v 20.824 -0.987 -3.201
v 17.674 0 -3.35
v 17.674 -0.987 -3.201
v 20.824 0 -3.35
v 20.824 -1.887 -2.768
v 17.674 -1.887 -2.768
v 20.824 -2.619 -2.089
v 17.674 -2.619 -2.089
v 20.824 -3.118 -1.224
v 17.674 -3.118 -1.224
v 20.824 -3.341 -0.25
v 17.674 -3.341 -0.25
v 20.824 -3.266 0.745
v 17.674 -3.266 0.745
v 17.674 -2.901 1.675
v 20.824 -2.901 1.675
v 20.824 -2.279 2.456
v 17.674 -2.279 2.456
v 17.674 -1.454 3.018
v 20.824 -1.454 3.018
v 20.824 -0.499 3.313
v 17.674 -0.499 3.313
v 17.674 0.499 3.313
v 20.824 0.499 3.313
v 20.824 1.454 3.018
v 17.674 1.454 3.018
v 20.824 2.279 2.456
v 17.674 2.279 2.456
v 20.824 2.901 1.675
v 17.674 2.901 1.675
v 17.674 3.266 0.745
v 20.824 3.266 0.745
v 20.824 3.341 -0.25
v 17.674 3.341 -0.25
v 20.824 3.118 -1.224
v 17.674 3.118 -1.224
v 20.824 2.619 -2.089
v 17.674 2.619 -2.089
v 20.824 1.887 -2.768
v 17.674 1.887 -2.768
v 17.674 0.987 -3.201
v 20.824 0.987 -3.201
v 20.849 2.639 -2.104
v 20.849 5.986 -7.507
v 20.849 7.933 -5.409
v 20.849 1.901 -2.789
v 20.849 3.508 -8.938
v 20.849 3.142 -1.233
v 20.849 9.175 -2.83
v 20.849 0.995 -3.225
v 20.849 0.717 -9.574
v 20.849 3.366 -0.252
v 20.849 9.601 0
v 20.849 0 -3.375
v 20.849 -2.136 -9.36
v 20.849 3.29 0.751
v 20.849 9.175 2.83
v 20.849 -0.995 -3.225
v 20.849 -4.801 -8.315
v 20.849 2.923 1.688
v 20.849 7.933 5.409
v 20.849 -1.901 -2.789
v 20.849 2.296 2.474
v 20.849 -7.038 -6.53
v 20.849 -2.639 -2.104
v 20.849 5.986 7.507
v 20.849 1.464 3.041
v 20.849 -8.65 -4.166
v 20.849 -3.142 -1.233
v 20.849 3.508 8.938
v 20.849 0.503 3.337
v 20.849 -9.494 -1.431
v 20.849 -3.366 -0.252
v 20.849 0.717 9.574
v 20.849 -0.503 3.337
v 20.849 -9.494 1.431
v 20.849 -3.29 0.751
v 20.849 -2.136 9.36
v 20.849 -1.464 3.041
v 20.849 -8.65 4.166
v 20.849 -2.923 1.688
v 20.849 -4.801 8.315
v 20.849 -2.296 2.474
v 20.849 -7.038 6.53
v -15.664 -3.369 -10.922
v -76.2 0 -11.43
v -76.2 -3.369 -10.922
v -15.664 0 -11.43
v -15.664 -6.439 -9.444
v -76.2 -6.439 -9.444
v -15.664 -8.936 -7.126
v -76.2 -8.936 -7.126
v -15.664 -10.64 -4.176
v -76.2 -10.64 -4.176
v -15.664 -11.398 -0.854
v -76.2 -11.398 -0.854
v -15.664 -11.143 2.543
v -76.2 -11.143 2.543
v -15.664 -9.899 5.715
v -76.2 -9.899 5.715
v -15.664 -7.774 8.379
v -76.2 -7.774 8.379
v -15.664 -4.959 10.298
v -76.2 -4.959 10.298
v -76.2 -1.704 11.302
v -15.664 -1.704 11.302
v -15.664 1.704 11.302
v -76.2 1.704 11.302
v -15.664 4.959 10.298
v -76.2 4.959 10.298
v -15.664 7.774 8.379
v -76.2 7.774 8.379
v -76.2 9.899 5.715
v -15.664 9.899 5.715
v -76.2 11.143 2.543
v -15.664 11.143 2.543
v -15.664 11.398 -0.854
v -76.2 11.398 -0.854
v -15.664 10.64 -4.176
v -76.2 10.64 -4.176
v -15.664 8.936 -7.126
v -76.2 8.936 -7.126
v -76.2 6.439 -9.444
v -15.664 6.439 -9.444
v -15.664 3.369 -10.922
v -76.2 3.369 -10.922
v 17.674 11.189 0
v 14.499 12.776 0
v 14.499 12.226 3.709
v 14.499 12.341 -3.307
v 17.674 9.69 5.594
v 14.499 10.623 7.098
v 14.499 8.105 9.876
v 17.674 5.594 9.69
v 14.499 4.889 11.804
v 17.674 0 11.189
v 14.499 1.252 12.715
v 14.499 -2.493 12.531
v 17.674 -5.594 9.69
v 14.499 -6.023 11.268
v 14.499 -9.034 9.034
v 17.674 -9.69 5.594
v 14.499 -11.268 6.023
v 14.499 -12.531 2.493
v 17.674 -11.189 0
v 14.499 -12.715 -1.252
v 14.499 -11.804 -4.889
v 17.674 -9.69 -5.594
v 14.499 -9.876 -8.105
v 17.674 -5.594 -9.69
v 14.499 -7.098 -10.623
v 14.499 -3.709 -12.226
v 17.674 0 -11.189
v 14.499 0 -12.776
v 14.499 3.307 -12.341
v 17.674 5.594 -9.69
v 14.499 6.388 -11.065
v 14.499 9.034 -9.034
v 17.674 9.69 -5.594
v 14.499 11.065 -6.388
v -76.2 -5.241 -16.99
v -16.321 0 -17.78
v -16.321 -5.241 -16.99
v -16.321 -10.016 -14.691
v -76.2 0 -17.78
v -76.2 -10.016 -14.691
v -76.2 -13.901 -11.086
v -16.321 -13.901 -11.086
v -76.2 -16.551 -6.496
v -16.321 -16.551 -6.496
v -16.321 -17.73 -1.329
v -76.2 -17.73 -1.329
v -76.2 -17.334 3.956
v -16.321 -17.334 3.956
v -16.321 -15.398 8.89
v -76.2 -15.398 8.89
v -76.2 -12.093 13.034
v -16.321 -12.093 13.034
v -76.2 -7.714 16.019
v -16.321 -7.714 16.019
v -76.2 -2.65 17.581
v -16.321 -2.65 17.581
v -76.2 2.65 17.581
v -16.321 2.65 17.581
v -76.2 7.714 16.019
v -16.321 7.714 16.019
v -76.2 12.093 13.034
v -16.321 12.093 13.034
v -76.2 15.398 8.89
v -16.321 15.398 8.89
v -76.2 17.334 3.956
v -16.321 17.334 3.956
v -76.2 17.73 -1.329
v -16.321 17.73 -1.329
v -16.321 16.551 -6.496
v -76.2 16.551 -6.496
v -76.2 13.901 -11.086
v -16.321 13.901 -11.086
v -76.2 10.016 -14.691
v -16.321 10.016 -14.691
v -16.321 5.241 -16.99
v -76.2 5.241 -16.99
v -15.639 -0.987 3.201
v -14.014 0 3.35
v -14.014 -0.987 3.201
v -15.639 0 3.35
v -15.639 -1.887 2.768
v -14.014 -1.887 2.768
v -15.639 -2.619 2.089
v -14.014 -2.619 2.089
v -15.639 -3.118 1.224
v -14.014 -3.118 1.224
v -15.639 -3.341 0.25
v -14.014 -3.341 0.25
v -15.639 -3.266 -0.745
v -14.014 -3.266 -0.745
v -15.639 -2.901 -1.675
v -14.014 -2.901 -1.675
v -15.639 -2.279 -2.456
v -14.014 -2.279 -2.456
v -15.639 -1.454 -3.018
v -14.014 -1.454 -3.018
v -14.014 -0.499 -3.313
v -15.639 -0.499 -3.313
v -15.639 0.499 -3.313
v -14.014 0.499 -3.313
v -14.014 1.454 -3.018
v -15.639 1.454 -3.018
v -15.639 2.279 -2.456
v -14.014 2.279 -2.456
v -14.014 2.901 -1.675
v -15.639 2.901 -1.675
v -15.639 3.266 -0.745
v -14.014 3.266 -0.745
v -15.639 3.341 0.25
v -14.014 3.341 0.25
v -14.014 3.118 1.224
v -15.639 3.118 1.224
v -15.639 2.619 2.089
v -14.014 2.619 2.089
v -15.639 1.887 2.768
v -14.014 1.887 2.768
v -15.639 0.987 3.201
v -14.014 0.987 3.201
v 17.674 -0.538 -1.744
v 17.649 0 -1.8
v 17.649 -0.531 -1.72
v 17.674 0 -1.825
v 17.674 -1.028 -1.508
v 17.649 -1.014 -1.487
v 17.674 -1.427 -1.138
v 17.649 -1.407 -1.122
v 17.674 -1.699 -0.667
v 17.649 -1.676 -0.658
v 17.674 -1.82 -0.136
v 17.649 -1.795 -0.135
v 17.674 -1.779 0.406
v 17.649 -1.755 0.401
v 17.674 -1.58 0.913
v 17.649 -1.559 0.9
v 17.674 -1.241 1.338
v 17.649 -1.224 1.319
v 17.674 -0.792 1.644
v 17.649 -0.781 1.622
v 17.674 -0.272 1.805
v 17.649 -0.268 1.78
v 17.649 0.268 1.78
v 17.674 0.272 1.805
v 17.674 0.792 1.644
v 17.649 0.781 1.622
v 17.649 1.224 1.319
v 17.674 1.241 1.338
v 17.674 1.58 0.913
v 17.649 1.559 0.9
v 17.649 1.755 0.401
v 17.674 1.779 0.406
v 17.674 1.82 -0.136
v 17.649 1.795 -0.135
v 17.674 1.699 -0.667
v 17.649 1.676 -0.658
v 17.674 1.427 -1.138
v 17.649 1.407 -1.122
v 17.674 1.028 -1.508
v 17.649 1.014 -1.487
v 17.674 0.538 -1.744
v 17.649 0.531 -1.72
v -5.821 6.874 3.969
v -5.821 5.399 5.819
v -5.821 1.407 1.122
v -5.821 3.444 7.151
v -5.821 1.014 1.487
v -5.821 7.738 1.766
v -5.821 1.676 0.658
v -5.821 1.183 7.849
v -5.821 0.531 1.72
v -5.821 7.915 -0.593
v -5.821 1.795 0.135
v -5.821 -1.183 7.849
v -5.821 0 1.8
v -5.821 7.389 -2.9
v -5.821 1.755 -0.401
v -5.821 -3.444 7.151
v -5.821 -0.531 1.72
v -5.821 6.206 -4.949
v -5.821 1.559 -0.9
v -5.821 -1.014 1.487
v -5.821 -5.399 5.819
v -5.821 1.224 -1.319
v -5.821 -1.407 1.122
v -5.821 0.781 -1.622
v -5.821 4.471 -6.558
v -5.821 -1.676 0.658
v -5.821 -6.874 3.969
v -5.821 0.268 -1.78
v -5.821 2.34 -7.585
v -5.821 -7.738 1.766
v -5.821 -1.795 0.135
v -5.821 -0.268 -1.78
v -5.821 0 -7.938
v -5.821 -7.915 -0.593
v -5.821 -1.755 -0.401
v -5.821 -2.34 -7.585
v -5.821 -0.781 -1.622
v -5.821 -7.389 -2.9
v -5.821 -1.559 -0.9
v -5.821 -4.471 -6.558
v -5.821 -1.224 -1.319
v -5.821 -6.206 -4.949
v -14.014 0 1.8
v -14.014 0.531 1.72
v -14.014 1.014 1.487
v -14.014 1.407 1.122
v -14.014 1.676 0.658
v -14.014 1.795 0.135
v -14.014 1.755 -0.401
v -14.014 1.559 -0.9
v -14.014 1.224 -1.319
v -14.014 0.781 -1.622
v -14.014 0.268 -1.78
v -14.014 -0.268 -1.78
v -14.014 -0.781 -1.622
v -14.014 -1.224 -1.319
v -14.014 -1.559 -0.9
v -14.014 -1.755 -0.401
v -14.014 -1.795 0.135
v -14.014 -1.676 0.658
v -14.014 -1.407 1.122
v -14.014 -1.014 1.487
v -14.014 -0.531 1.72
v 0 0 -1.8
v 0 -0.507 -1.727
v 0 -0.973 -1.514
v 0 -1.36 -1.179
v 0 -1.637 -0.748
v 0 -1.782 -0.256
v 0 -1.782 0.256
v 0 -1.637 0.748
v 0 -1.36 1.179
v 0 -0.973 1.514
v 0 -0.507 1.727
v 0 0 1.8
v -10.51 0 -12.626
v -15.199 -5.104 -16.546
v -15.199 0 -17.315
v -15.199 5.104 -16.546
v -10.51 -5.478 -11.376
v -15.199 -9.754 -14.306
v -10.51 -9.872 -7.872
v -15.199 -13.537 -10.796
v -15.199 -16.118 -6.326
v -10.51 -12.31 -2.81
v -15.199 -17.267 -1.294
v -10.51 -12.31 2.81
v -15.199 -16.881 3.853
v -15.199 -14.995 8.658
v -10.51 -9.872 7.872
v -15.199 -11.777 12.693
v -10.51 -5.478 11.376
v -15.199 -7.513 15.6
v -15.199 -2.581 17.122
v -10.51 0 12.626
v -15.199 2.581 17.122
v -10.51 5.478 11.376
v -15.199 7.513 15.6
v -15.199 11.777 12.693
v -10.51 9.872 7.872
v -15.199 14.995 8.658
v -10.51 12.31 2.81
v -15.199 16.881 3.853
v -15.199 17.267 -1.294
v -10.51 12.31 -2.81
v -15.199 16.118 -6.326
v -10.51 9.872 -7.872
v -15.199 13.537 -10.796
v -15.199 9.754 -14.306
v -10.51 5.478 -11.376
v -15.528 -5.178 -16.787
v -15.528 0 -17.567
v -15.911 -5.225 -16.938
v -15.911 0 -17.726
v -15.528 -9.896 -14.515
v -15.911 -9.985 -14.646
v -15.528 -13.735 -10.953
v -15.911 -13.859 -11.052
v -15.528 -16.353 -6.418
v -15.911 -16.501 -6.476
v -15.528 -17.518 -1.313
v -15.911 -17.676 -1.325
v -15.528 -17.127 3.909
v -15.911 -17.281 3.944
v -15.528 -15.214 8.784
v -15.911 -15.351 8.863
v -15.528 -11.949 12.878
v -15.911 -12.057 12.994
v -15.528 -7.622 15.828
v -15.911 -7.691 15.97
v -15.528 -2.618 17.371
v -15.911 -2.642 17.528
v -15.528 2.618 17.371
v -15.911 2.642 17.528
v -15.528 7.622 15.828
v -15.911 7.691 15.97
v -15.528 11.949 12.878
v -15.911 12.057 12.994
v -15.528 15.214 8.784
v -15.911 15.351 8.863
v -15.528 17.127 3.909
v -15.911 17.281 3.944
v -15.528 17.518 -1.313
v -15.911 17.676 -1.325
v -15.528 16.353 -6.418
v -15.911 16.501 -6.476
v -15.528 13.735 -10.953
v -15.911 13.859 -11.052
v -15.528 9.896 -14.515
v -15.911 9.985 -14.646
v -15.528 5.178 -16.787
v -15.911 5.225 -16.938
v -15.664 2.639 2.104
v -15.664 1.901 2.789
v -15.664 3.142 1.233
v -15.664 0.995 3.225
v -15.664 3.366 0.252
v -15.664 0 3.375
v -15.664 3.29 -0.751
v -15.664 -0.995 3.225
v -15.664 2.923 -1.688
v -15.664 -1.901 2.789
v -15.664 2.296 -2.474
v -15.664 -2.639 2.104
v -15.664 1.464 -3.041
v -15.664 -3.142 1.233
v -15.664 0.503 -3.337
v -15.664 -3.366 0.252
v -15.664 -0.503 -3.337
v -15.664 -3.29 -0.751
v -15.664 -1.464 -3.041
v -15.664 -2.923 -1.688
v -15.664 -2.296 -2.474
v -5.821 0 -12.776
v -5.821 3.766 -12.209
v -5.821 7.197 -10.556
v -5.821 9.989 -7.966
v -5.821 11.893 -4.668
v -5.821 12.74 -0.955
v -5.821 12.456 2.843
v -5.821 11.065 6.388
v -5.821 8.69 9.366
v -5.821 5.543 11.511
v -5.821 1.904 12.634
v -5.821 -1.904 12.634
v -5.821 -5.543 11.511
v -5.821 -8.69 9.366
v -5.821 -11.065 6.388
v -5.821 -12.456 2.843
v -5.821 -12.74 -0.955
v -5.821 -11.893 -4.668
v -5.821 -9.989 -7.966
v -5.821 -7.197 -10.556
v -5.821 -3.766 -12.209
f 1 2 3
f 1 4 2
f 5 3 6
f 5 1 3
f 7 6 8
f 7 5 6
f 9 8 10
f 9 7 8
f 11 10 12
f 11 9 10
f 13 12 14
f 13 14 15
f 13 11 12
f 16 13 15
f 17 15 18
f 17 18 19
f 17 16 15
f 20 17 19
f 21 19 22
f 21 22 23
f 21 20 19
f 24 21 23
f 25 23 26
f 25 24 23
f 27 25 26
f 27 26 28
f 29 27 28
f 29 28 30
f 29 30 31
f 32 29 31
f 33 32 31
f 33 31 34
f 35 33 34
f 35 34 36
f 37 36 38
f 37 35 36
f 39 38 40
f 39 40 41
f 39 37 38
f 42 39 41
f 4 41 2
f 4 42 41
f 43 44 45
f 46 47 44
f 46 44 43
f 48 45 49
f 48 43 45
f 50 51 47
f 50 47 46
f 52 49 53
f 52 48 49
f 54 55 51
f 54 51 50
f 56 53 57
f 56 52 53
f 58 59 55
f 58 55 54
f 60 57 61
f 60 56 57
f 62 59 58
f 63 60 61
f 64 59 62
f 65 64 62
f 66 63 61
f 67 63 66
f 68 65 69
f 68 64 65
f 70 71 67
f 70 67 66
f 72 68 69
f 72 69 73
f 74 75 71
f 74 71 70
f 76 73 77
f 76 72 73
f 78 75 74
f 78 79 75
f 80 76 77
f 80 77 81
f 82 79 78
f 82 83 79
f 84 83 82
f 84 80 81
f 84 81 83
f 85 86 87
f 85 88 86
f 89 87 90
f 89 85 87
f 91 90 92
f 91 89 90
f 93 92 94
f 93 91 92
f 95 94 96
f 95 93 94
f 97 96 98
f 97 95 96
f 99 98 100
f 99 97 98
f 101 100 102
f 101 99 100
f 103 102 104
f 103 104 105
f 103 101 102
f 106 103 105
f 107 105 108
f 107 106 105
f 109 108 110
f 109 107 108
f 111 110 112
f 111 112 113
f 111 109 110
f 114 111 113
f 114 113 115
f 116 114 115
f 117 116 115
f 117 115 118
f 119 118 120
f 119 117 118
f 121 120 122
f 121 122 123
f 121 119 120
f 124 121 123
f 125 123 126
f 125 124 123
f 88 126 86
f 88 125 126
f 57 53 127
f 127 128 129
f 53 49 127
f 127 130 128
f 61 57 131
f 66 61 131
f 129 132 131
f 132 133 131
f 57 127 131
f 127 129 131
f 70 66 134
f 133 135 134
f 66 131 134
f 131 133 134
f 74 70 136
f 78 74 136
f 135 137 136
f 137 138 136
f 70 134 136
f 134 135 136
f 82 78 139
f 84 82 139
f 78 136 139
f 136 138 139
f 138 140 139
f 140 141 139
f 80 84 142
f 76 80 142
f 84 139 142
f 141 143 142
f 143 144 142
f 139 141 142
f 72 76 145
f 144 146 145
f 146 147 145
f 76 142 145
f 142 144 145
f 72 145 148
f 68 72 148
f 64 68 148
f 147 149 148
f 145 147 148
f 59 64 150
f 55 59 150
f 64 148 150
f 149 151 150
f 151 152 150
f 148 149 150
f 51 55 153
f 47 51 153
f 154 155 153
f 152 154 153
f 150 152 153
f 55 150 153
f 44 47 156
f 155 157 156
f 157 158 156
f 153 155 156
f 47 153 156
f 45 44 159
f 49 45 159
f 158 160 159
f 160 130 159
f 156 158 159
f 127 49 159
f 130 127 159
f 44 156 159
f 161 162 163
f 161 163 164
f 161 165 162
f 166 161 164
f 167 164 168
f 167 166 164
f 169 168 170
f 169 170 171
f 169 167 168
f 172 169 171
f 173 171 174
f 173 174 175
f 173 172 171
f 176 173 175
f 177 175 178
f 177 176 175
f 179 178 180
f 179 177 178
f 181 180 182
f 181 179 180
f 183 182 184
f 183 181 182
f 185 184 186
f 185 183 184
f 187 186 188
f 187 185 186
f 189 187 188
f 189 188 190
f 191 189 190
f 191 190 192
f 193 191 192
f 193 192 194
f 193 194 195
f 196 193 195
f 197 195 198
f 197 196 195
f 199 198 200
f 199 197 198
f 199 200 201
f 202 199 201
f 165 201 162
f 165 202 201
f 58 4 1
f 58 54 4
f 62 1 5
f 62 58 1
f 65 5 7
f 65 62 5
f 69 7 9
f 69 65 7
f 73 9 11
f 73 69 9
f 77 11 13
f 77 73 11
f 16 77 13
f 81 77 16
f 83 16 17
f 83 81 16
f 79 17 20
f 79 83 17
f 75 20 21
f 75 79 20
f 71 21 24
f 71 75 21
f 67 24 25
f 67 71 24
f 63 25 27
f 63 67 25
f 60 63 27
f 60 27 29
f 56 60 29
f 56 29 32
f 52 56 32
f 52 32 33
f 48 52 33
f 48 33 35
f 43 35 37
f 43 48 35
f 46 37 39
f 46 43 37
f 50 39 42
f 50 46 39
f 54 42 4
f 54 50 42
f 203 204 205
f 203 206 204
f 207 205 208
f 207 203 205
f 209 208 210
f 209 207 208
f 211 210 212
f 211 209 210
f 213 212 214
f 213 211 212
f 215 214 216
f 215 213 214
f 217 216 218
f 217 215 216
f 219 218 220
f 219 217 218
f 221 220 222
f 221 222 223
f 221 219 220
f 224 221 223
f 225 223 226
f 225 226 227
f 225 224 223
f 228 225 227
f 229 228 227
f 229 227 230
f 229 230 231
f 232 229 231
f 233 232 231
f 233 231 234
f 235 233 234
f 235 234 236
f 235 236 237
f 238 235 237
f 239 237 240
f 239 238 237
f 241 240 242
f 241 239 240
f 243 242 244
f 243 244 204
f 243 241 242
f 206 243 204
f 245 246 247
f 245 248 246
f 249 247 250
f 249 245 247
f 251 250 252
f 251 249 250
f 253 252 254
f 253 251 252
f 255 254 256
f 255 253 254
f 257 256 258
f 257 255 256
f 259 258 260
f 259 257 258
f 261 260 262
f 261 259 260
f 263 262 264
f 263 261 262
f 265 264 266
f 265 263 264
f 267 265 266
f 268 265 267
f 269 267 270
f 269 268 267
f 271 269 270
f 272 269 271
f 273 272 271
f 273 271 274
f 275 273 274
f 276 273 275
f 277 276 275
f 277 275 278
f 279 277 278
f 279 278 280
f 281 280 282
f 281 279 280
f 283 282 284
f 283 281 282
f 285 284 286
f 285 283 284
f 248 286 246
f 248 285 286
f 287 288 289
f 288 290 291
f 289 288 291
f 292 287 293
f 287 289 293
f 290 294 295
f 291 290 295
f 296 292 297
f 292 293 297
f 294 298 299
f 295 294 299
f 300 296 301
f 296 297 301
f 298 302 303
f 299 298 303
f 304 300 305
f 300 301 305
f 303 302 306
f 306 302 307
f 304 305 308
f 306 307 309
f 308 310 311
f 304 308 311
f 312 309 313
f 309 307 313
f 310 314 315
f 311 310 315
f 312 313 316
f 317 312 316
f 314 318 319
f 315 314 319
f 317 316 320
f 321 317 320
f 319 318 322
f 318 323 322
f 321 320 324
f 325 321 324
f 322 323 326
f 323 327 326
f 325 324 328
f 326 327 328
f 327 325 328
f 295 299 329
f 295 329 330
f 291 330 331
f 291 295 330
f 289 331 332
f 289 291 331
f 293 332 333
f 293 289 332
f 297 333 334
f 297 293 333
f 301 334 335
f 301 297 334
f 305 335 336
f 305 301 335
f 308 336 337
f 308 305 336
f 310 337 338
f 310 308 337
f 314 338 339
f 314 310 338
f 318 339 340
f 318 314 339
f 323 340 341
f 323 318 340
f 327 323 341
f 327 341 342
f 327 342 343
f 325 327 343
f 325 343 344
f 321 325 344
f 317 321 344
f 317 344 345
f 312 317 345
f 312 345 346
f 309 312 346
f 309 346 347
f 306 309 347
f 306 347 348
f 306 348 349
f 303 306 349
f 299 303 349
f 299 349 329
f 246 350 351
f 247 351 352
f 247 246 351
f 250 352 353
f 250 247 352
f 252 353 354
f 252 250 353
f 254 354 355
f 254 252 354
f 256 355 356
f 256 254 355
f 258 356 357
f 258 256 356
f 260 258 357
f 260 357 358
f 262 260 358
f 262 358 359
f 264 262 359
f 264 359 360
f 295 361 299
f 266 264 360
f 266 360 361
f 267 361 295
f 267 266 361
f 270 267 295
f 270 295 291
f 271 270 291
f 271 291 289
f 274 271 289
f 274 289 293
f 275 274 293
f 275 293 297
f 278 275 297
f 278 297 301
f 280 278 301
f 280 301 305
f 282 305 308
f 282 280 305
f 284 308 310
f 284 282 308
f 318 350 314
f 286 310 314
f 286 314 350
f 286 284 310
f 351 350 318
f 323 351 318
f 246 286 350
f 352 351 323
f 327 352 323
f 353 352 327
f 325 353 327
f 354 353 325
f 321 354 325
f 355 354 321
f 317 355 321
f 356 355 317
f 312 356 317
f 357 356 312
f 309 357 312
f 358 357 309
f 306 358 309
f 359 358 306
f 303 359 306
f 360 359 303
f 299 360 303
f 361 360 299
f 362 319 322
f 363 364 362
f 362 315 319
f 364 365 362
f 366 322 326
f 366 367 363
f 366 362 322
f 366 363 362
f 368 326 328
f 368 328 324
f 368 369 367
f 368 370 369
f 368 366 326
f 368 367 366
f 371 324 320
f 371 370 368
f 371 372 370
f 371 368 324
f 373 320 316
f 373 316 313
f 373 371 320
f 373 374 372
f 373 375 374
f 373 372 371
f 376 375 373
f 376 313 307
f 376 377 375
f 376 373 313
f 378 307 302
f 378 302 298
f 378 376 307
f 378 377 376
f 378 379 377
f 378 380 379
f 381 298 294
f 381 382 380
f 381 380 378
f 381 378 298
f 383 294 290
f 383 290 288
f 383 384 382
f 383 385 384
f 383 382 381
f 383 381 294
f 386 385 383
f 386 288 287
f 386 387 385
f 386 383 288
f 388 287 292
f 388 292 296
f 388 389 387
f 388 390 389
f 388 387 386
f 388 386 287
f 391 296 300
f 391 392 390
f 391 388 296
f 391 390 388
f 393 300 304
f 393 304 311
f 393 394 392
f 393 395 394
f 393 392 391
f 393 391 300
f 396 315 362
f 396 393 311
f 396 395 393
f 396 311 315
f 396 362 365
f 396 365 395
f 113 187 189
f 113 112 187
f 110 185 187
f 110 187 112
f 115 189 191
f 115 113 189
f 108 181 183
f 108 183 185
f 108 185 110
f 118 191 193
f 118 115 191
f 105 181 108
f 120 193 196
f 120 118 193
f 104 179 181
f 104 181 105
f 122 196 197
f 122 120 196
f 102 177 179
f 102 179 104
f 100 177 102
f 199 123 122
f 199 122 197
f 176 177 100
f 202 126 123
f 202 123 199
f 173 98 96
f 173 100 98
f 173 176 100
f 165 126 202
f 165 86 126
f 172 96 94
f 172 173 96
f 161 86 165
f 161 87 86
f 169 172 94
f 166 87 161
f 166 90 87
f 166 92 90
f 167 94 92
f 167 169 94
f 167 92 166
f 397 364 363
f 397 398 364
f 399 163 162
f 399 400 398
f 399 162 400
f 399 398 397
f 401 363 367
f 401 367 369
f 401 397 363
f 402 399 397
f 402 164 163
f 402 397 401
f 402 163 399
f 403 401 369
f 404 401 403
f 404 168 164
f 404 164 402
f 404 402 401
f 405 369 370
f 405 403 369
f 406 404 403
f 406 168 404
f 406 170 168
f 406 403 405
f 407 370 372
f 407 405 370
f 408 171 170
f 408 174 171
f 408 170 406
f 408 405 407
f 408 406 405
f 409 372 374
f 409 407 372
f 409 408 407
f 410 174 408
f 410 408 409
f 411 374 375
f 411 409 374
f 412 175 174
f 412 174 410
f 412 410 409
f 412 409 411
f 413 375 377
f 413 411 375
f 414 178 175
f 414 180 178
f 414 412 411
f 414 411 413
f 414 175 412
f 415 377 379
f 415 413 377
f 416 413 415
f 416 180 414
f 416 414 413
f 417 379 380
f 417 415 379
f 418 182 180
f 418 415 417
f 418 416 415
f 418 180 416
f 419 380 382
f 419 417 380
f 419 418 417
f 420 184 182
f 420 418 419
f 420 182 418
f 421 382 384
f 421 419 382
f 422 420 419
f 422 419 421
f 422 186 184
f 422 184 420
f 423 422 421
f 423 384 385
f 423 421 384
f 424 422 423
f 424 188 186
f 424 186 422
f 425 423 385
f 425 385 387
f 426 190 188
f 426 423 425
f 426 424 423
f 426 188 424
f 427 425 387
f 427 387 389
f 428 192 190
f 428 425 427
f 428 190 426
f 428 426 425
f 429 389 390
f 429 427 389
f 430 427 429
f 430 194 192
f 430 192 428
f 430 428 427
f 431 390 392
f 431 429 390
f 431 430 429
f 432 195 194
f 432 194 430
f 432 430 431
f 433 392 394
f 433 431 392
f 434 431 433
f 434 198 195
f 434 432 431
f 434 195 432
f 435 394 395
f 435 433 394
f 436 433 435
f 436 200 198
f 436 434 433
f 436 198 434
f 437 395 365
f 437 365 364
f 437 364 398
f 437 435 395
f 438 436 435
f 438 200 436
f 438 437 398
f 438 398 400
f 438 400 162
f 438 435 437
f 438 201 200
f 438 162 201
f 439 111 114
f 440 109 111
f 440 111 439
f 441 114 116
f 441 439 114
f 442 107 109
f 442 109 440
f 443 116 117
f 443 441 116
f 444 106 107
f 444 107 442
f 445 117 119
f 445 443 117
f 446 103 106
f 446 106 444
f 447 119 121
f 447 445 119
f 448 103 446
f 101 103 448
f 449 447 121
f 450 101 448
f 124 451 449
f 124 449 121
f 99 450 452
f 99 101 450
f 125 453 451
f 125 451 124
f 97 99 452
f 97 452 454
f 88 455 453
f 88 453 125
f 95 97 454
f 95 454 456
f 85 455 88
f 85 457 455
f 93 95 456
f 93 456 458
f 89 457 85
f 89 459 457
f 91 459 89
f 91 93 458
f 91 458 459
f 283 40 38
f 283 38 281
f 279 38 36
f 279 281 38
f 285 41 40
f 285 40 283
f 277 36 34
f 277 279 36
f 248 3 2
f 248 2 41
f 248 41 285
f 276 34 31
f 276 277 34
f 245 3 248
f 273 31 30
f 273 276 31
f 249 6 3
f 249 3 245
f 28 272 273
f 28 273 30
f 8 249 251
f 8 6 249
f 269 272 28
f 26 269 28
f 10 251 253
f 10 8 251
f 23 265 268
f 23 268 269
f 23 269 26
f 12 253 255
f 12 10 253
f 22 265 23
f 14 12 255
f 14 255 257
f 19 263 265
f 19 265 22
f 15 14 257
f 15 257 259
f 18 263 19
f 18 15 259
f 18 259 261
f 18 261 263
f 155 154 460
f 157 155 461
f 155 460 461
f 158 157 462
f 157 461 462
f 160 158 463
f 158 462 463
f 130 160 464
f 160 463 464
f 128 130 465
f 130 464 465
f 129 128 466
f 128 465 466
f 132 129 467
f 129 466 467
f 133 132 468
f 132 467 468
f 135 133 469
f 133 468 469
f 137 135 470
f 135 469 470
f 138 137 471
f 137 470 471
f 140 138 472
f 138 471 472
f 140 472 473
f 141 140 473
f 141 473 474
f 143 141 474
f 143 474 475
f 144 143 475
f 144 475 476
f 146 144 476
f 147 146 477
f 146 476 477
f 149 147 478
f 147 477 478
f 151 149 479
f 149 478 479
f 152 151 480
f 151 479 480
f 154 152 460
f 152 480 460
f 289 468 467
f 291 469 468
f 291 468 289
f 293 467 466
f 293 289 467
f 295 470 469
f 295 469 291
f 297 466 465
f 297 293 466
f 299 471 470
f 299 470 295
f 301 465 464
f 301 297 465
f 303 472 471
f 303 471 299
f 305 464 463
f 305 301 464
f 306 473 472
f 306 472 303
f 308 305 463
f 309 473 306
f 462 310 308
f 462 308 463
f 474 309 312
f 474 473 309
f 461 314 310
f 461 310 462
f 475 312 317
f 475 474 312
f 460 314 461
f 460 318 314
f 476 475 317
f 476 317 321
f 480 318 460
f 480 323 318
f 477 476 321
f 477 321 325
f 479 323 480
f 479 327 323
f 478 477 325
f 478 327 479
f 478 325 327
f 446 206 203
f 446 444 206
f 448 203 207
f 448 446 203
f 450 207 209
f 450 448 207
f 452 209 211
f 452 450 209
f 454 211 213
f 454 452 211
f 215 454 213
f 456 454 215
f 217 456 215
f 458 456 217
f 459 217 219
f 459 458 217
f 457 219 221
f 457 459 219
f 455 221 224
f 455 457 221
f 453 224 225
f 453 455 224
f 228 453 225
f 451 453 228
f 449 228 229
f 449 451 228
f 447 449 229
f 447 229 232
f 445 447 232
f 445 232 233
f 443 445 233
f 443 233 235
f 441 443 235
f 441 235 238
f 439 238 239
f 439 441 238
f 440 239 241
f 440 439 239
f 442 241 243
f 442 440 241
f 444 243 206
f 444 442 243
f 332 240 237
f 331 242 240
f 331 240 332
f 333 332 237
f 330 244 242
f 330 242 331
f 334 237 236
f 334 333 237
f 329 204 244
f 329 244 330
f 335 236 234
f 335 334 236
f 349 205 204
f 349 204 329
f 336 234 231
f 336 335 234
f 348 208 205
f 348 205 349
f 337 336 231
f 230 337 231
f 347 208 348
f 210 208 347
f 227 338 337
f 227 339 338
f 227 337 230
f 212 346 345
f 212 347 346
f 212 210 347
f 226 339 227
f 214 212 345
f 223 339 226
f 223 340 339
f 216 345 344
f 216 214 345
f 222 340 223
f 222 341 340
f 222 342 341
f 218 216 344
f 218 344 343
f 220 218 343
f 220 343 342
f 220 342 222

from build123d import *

# Parameters (mm, degrees)
SKETCH10_R          = 12.7762
BOSS_EXTRUDE1_DEPTH = 19.05
CHAMFER1_SIZE       = 6.35
CHAMFER1_SIZE2      = 3.175


with BuildPart() as part:
    # Sketch3 → Revolve1 (revolve)
    with BuildSketch(Plane.XY):
        with BuildLine():
            Line((-76.2, 17.78), (-76.2, 11.43))
            Line((-76.2, 11.43), (-15.663873033, 11.43))
            Line((-15.663873033, 11.43), (-15.663873033, 0))
            Line((-15.663873033, 0), (-5.821373033, 0))
            Line((-5.821373033, 0), (1.798626967, 0))
            Line((1.798626967, 0), (20.848626967, 0))
            Line((20.848626967, 0), (20.848626967, 12.7762))
            Line((20.848626967, 12.7762), (1.798626967, 12.7762))
            Line((1.798626967, 12.7762), (-5.821373033, 12.7762))
            Line((-5.821373033, 12.7762), (-5.821373033, 7.9375))
            Line((-5.821373033, 7.9375), (-15.198905048, 17.315032015))
            ThreePointArc((-15.198905048, 17.315032015), (-15.713927115, 17.659158758), (-16.321437064, 17.78))
            Line((-16.321437064, 17.78), (-76.2, 17.78))
        make_face()
    revolve(axis=Axis((24.172114646, 0, 0), (-1, 0, 0)))

    # Sketch6 → CBORE for M3 SBHCS1 (revolve, cut)
    with BuildSketch(Plane(origin=(-15.663873033, 0, 0), x_dir=(0, 0, 1), z_dir=(0, 1, 0))):
        Polygon((0, 0), (0, 36.5125), (1.8, 36.5125), (1.8, 1.65), (3.35, 1.65), (3.35, 0.025), (3.375, 0), align=None)
    revolve(axis=Axis((-22.013873033, 0, 0), (1, 0, 0)), mode=Mode.SUBTRACT)

    # Sketch10 → Boss-Extrude1 (add)
    with BuildSketch(Plane(origin=(0, 0, 0), x_dir=(0, 0, -1), z_dir=(1, 0, 0))):
        Circle(SKETCH10_R)
    extrude(amount=BOSS_EXTRUDE1_DEPTH)

    # Chamfer1
    chamfer1_edges = [part.edges().sort_by_distance(p)[0] for p in [
        (20.848626967, -12.7762, 0),
    ]]
    chamfer1_side = [part.faces().sort_by_distance(p)[0] for p in [
        (7.513626967, -12.7762, 0),
    ]]
    chamfer(chamfer1_edges, length=CHAMFER1_SIZE, length2=CHAMFER1_SIZE2, reference=chamfer1_side[0])

    # Sketch12 → CBORE for M3 SBHCS3 (revolve, cut)
    with BuildSketch(Plane(origin=(20.848626967, 0, 0), x_dir=(0, 0, -1), z_dir=(0, 1, 0))):
        Polygon((0, 0), (0, 97.048626967), (1.8, 97.048626967), (1.8, 3.2), (1.825, 3.175), (3.35, 3.175), (3.35, 0.025), (3.375, 0), align=None)
    revolve(axis=Axis((27.198626967, 0, 0), (-1, 0, 0)), mode=Mode.SUBTRACT)


with BuildPart() as body_2:
    # split 2: the piece on the far side of the plane
    add(part.part)
    split(bisect_by=Plane(origin=(-5.821373033, 0, 0), x_dir=(0, 0, -1), z_dir=(-1, 0, 0)), keep=Keep.BOTTOM)


with BuildPart() as part_1:
    add(part.part)

    # split 2
    split(bisect_by=Plane(origin=(-5.821373033, 0, 0), x_dir=(0, 0, -1), z_dir=(-1, 0, 0)), keep=Keep.TOP)


solid = Compound([body_2.part, part_1.part])
